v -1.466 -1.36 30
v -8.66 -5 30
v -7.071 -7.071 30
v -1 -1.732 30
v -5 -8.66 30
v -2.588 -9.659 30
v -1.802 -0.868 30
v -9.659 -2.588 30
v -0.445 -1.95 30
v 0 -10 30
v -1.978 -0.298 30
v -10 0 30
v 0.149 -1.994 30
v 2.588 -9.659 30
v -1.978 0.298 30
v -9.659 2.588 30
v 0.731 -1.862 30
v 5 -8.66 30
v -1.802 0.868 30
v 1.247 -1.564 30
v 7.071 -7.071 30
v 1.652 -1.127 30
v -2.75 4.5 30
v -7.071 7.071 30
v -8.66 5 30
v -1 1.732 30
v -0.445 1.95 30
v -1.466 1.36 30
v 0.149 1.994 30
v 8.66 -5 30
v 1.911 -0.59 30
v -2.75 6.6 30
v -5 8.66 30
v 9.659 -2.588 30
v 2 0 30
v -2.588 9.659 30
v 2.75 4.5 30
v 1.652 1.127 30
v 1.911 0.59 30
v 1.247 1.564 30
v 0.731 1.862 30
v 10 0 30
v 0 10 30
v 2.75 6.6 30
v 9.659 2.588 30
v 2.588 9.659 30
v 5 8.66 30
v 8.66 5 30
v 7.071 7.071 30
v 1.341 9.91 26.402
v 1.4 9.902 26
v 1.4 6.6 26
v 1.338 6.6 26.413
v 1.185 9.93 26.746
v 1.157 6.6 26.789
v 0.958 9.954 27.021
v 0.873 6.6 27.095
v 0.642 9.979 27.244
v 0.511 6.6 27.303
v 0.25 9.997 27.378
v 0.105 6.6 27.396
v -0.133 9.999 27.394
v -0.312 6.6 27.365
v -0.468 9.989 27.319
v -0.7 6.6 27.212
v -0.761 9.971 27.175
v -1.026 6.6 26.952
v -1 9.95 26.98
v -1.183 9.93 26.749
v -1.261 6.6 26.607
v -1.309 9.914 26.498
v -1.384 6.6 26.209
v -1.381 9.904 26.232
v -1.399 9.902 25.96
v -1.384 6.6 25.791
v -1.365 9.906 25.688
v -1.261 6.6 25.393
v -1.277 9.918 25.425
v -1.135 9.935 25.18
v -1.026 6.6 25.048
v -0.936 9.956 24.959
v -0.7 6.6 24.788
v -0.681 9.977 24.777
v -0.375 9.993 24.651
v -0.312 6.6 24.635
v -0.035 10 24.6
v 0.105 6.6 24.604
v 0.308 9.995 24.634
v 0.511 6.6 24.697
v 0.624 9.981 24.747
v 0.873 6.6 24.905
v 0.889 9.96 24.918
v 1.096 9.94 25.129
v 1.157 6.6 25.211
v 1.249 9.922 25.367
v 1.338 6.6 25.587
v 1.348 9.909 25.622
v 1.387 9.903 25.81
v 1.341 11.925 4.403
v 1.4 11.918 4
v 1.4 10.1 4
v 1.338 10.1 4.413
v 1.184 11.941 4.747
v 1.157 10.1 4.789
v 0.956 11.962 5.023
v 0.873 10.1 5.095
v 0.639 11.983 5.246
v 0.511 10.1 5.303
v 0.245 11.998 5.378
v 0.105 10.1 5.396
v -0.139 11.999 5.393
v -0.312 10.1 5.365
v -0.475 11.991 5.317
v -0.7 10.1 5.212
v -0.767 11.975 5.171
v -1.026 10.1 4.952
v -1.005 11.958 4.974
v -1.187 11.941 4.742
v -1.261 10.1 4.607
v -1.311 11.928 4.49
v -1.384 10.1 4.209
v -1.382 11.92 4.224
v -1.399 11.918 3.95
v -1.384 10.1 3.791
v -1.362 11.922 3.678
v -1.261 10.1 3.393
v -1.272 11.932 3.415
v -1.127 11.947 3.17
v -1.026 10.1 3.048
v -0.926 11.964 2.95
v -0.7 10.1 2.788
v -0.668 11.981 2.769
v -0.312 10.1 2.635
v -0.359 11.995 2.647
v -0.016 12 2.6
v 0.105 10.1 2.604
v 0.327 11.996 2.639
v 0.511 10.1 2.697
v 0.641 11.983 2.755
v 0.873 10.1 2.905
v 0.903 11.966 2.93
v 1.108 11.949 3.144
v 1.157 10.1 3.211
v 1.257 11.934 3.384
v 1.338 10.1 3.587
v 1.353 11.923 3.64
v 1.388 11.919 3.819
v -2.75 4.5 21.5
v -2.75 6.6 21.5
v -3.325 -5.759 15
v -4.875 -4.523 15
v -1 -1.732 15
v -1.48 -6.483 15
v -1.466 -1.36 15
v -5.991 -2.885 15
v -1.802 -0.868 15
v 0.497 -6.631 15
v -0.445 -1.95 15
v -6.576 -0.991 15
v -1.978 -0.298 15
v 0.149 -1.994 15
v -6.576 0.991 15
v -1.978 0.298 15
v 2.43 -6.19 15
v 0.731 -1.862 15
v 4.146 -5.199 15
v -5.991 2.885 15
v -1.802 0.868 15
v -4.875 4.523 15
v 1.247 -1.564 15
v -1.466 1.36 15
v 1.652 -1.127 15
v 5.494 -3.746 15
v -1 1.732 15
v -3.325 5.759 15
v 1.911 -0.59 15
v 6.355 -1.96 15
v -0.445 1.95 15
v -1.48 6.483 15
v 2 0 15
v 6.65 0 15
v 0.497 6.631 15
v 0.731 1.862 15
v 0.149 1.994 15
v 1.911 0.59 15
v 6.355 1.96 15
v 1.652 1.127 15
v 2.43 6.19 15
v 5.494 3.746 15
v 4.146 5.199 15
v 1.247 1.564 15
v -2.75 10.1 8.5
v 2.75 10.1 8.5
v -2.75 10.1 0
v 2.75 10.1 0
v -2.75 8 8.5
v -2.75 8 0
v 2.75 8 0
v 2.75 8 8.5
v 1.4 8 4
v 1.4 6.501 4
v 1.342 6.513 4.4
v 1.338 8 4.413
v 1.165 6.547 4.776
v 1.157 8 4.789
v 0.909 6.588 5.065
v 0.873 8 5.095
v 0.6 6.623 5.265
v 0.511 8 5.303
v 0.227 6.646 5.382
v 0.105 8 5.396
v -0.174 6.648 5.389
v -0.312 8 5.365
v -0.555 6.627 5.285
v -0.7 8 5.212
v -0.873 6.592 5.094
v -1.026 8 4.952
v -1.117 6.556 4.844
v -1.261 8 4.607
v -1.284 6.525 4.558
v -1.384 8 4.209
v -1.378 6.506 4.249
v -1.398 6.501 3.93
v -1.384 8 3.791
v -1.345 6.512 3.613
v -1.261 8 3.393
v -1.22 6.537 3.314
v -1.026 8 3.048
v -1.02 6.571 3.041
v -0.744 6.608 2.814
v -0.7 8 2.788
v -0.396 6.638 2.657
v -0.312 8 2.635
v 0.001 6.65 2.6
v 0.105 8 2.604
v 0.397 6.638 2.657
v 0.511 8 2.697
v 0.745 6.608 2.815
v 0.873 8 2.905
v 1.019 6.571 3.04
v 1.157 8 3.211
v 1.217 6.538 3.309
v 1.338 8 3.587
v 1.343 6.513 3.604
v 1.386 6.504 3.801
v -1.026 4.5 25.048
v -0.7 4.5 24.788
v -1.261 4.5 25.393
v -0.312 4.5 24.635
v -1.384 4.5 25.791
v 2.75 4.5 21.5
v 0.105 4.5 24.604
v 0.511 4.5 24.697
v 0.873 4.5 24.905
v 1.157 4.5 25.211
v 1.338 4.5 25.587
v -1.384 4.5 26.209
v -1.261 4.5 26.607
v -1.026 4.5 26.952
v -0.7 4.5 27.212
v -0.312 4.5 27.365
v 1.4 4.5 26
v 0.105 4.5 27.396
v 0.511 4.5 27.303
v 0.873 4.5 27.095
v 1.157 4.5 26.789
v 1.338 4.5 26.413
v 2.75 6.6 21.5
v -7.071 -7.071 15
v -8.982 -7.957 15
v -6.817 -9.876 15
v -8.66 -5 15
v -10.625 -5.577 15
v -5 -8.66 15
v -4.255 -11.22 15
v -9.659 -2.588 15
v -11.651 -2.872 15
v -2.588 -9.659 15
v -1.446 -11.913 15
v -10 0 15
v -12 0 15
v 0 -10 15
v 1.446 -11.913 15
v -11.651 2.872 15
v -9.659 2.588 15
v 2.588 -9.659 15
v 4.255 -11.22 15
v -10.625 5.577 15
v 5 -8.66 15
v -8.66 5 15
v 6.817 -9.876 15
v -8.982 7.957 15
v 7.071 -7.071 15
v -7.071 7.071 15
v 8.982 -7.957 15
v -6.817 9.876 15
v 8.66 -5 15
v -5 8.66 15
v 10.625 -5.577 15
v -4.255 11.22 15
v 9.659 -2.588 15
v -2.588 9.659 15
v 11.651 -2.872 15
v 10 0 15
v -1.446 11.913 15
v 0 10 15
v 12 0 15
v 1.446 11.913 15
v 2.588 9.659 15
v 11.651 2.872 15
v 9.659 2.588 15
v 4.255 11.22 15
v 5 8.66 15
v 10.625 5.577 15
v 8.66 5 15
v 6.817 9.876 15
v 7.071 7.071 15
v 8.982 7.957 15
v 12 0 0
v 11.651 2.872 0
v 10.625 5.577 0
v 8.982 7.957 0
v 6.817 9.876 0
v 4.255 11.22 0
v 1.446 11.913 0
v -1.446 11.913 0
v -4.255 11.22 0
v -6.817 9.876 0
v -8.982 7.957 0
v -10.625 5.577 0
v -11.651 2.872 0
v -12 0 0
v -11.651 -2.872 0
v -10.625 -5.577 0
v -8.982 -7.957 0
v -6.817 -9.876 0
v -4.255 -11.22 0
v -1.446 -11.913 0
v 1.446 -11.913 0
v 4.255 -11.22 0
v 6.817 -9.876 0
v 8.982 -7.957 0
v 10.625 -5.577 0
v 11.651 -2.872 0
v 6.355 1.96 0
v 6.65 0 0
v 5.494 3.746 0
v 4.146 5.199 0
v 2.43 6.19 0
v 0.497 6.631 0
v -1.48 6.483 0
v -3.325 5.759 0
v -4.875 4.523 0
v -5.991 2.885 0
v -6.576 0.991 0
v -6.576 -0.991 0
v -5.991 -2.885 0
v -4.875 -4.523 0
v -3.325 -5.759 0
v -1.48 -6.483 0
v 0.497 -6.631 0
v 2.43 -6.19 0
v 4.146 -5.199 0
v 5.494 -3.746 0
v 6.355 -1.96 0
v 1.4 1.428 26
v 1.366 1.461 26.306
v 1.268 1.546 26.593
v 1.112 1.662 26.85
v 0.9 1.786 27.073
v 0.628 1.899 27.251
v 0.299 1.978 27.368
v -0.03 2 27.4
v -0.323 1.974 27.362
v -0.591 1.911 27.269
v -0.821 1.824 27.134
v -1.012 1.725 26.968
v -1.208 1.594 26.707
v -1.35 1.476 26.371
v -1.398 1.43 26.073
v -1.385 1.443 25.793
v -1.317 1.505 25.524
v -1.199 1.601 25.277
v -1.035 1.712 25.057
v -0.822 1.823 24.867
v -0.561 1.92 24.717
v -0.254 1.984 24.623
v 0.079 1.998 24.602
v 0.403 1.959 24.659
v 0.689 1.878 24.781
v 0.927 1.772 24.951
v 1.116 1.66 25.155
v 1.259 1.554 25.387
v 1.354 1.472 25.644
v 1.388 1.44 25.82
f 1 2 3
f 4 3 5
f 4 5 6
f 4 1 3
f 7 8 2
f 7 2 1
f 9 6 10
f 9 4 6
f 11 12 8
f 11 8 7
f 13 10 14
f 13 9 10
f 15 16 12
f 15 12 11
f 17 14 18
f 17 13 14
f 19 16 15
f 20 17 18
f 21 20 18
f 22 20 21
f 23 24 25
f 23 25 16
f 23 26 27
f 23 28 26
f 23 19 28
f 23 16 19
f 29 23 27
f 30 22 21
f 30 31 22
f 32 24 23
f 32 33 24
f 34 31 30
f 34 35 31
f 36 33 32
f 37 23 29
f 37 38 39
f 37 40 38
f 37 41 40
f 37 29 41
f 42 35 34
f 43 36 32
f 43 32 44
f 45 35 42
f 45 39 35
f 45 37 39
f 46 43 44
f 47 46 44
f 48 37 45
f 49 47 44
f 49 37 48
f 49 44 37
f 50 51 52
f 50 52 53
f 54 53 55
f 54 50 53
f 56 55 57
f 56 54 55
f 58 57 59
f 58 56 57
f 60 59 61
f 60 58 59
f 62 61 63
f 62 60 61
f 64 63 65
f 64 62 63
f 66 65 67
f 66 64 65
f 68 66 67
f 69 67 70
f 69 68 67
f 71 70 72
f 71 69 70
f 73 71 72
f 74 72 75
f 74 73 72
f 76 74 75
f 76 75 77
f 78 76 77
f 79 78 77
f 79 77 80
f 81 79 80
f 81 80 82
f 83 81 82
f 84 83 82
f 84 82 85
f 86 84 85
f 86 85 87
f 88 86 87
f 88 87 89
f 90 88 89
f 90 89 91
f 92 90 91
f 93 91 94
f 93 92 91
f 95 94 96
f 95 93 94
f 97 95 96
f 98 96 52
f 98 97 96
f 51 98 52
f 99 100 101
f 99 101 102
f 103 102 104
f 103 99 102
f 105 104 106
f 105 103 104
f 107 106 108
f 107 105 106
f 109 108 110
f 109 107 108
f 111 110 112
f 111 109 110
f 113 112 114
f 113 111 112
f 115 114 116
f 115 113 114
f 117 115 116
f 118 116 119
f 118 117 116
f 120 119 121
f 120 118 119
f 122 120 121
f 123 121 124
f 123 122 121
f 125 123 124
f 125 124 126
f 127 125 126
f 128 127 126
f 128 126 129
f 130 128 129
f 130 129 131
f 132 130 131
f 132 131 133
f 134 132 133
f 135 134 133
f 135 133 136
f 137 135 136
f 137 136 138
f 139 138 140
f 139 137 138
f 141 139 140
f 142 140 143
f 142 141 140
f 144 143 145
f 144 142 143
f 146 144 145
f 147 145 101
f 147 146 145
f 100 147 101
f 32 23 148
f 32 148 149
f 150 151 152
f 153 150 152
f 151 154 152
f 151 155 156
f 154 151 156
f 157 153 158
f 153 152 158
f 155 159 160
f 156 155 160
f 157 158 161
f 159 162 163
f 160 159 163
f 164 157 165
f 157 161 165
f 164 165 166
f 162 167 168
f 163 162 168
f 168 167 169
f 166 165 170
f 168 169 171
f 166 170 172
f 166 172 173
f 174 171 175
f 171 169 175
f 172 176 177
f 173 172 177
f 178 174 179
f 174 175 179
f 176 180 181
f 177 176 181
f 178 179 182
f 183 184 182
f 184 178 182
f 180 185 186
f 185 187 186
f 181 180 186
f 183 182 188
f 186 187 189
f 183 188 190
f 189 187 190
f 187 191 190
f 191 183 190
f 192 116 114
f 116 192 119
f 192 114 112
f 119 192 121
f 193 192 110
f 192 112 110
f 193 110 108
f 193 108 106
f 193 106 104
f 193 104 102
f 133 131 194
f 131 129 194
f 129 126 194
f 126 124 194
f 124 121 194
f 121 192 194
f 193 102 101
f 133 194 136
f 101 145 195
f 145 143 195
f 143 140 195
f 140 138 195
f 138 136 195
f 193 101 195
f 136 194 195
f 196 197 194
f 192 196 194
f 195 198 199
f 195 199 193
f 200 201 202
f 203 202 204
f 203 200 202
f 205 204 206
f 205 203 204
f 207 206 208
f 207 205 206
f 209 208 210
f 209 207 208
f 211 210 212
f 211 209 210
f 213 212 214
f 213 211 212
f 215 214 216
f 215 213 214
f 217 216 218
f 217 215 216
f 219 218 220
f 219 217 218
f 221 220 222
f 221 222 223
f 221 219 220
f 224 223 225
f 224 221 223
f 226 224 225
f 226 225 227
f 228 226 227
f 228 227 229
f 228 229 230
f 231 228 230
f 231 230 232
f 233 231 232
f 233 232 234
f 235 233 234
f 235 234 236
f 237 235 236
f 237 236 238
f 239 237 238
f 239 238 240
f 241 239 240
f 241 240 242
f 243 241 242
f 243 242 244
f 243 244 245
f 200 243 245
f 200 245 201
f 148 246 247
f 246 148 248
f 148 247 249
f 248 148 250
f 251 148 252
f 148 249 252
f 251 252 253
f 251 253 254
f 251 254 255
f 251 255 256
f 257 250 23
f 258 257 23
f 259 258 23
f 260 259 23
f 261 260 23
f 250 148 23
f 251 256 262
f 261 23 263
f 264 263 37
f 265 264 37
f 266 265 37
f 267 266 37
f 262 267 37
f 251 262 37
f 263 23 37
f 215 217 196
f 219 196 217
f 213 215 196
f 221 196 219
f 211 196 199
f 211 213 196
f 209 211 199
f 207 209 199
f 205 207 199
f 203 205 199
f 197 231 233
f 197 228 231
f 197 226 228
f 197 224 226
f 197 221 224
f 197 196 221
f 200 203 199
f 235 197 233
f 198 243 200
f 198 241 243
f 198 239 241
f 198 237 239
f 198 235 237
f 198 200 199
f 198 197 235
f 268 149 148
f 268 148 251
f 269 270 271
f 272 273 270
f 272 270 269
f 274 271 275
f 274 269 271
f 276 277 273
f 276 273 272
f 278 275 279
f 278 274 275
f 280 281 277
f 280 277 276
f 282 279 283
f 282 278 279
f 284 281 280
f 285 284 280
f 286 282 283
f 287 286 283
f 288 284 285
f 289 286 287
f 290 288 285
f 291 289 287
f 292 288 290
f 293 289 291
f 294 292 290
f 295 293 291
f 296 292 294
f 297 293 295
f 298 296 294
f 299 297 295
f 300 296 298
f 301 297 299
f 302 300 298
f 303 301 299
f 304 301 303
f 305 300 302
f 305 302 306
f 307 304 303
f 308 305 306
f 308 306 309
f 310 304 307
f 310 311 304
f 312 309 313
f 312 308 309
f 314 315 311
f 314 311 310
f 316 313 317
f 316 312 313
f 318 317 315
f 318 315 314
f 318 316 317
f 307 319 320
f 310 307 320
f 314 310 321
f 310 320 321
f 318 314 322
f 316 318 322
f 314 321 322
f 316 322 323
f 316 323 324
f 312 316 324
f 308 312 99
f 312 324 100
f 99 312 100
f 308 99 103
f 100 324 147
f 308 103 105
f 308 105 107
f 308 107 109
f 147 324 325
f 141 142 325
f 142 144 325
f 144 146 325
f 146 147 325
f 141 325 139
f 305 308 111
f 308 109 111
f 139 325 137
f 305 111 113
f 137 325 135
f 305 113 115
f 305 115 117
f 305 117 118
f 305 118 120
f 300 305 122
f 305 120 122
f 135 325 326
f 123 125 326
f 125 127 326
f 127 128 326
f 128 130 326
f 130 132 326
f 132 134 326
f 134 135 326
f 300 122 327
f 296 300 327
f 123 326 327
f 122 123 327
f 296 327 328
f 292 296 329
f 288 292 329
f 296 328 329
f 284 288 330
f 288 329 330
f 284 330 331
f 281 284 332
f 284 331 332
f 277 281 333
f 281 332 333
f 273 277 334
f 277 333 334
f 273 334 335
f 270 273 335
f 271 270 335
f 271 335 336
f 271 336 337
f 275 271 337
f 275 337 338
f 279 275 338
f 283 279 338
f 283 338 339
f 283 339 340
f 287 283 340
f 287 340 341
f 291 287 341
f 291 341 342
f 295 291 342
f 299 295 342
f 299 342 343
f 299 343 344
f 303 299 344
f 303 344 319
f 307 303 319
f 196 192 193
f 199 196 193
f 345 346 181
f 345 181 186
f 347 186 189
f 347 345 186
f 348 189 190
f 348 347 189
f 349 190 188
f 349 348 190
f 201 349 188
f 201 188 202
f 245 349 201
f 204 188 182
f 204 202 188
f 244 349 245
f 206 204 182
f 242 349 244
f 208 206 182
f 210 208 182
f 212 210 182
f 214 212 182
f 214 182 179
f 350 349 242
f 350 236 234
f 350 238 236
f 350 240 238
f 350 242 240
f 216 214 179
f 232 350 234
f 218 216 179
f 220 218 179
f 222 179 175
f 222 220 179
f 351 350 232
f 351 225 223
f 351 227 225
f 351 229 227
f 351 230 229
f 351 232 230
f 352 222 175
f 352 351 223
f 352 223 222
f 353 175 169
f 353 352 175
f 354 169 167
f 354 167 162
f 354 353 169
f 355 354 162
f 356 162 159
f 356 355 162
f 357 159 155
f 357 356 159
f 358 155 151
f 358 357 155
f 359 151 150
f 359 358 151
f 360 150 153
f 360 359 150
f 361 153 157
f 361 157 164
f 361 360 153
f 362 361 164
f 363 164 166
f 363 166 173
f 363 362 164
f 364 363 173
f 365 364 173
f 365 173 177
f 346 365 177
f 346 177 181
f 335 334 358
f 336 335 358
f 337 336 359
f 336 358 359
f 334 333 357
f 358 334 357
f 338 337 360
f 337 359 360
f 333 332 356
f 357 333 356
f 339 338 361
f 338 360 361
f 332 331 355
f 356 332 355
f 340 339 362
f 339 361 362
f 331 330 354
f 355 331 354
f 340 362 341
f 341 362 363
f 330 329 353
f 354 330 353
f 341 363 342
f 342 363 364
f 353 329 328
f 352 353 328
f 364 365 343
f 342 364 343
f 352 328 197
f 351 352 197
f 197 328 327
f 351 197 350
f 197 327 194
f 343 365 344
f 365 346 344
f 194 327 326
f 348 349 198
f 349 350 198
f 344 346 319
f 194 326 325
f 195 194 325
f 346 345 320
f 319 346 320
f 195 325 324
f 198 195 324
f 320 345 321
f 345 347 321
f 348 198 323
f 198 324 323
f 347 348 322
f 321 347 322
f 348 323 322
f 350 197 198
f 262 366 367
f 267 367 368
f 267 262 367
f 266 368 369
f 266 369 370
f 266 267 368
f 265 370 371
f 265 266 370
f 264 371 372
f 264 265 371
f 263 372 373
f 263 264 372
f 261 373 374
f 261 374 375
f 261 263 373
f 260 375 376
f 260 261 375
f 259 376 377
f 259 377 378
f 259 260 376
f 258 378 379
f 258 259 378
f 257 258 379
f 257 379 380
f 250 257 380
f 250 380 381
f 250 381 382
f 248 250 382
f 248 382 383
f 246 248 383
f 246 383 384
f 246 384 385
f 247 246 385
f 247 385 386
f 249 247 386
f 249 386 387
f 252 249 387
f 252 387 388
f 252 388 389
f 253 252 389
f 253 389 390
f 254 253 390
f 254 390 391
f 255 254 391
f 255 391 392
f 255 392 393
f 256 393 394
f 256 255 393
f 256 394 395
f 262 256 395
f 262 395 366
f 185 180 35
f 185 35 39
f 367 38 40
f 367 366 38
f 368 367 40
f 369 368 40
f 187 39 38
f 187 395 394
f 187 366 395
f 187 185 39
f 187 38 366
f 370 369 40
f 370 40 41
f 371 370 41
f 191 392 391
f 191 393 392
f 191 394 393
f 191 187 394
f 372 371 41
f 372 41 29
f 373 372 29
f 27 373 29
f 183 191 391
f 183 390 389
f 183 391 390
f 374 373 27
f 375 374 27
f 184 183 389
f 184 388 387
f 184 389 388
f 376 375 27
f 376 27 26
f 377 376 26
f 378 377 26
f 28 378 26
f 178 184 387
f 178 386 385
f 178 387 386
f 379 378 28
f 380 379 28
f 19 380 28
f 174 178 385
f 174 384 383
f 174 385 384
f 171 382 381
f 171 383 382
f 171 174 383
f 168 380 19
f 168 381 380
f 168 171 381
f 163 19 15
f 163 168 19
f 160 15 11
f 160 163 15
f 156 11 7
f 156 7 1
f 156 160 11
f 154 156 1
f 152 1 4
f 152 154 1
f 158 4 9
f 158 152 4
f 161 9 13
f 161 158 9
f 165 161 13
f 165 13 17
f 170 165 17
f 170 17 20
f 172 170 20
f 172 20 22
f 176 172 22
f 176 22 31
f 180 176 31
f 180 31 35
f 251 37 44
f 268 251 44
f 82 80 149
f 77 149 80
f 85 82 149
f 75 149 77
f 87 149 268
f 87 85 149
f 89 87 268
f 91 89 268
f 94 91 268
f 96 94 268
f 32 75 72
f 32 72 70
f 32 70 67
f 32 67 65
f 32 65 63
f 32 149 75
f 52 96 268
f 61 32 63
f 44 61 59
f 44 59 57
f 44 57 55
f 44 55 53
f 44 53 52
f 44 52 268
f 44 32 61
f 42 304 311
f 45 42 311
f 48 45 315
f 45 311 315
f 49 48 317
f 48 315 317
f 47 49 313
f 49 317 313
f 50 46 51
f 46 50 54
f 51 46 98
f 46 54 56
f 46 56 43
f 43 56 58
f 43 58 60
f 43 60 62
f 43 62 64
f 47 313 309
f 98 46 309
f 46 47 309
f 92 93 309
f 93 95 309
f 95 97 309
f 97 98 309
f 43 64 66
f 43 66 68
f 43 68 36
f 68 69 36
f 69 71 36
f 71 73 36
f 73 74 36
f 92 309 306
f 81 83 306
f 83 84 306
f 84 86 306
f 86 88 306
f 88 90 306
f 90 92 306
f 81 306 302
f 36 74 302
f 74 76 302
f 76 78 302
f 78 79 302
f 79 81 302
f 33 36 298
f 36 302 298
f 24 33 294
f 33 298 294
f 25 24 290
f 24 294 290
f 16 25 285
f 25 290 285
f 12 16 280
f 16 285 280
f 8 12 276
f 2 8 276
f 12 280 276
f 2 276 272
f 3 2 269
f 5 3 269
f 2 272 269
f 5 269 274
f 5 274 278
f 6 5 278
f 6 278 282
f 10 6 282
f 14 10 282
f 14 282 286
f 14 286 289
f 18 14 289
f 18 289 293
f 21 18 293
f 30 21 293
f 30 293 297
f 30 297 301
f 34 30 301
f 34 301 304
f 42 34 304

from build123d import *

# Parameters (mm, degrees)
F0_R      = 12
F0_R_2    = 6.65
F1_DEPTH  = 15
F3_R      = 1.4
F4_DEPTH  = 10
F5_R      = 10
F5_R_2    = 2
F6_DEPTH  = 15
F8_R      = 1.4
F9_DEPTH  = 11
F10_W     = 5.5
F10_H     = 2.1
F11_DEPTH = 8.5
F12_W     = 5.5
F12_H     = 2.1
F13_DEPTH = 8.5


# Not quite as in the source:
# - a feature names something its author has since deleted; it is built from what else it names


with BuildPart() as f1:
    # F0 (on Top) → F1 (new body)
    with BuildSketch(Plane.XY):
        Circle(F0_R)
        Circle(F0_R_2, mode=Mode.SUBTRACT)
    extrude(amount=F1_DEPTH)

    # F3 (on offset) → F4 (cut)
    with BuildSketch(Plane.XZ.offset(-14)):
        with Locations((0, 4)):
            Circle(F3_R)
    extrude(amount=F4_DEPTH, mode=Mode.SUBTRACT)

    # F5 (on face) → F6 (join)
    with BuildSketch(Plane.XY.offset(15)):
        Circle(F5_R)
        Circle(F5_R_2, mode=Mode.SUBTRACT)
    extrude(amount=F6_DEPTH)

    # F8 (on offset) → F9 (cut)
    with BuildSketch(Plane.XZ.offset(-11.5)):
        with Locations((0, 26)):
            Circle(F8_R)
    extrude(amount=F9_DEPTH, mode=Mode.SUBTRACT)

    # F10 (on face) → F11 (cut)
    with BuildSketch(Plane.XY.offset(30)):
        with Locations((0, 5.55)):
            Rectangle(F10_W, F10_H)
    extrude(amount=-F11_DEPTH, mode=Mode.SUBTRACT)

    # F12 (on face) → F13 (cut)
    with BuildSketch(Plane.XY):
        with Locations((0, 9.05)):
            Rectangle(F12_W, F12_H)
    extrude(amount=F13_DEPTH, mode=Mode.SUBTRACT)


solid = f1.part
